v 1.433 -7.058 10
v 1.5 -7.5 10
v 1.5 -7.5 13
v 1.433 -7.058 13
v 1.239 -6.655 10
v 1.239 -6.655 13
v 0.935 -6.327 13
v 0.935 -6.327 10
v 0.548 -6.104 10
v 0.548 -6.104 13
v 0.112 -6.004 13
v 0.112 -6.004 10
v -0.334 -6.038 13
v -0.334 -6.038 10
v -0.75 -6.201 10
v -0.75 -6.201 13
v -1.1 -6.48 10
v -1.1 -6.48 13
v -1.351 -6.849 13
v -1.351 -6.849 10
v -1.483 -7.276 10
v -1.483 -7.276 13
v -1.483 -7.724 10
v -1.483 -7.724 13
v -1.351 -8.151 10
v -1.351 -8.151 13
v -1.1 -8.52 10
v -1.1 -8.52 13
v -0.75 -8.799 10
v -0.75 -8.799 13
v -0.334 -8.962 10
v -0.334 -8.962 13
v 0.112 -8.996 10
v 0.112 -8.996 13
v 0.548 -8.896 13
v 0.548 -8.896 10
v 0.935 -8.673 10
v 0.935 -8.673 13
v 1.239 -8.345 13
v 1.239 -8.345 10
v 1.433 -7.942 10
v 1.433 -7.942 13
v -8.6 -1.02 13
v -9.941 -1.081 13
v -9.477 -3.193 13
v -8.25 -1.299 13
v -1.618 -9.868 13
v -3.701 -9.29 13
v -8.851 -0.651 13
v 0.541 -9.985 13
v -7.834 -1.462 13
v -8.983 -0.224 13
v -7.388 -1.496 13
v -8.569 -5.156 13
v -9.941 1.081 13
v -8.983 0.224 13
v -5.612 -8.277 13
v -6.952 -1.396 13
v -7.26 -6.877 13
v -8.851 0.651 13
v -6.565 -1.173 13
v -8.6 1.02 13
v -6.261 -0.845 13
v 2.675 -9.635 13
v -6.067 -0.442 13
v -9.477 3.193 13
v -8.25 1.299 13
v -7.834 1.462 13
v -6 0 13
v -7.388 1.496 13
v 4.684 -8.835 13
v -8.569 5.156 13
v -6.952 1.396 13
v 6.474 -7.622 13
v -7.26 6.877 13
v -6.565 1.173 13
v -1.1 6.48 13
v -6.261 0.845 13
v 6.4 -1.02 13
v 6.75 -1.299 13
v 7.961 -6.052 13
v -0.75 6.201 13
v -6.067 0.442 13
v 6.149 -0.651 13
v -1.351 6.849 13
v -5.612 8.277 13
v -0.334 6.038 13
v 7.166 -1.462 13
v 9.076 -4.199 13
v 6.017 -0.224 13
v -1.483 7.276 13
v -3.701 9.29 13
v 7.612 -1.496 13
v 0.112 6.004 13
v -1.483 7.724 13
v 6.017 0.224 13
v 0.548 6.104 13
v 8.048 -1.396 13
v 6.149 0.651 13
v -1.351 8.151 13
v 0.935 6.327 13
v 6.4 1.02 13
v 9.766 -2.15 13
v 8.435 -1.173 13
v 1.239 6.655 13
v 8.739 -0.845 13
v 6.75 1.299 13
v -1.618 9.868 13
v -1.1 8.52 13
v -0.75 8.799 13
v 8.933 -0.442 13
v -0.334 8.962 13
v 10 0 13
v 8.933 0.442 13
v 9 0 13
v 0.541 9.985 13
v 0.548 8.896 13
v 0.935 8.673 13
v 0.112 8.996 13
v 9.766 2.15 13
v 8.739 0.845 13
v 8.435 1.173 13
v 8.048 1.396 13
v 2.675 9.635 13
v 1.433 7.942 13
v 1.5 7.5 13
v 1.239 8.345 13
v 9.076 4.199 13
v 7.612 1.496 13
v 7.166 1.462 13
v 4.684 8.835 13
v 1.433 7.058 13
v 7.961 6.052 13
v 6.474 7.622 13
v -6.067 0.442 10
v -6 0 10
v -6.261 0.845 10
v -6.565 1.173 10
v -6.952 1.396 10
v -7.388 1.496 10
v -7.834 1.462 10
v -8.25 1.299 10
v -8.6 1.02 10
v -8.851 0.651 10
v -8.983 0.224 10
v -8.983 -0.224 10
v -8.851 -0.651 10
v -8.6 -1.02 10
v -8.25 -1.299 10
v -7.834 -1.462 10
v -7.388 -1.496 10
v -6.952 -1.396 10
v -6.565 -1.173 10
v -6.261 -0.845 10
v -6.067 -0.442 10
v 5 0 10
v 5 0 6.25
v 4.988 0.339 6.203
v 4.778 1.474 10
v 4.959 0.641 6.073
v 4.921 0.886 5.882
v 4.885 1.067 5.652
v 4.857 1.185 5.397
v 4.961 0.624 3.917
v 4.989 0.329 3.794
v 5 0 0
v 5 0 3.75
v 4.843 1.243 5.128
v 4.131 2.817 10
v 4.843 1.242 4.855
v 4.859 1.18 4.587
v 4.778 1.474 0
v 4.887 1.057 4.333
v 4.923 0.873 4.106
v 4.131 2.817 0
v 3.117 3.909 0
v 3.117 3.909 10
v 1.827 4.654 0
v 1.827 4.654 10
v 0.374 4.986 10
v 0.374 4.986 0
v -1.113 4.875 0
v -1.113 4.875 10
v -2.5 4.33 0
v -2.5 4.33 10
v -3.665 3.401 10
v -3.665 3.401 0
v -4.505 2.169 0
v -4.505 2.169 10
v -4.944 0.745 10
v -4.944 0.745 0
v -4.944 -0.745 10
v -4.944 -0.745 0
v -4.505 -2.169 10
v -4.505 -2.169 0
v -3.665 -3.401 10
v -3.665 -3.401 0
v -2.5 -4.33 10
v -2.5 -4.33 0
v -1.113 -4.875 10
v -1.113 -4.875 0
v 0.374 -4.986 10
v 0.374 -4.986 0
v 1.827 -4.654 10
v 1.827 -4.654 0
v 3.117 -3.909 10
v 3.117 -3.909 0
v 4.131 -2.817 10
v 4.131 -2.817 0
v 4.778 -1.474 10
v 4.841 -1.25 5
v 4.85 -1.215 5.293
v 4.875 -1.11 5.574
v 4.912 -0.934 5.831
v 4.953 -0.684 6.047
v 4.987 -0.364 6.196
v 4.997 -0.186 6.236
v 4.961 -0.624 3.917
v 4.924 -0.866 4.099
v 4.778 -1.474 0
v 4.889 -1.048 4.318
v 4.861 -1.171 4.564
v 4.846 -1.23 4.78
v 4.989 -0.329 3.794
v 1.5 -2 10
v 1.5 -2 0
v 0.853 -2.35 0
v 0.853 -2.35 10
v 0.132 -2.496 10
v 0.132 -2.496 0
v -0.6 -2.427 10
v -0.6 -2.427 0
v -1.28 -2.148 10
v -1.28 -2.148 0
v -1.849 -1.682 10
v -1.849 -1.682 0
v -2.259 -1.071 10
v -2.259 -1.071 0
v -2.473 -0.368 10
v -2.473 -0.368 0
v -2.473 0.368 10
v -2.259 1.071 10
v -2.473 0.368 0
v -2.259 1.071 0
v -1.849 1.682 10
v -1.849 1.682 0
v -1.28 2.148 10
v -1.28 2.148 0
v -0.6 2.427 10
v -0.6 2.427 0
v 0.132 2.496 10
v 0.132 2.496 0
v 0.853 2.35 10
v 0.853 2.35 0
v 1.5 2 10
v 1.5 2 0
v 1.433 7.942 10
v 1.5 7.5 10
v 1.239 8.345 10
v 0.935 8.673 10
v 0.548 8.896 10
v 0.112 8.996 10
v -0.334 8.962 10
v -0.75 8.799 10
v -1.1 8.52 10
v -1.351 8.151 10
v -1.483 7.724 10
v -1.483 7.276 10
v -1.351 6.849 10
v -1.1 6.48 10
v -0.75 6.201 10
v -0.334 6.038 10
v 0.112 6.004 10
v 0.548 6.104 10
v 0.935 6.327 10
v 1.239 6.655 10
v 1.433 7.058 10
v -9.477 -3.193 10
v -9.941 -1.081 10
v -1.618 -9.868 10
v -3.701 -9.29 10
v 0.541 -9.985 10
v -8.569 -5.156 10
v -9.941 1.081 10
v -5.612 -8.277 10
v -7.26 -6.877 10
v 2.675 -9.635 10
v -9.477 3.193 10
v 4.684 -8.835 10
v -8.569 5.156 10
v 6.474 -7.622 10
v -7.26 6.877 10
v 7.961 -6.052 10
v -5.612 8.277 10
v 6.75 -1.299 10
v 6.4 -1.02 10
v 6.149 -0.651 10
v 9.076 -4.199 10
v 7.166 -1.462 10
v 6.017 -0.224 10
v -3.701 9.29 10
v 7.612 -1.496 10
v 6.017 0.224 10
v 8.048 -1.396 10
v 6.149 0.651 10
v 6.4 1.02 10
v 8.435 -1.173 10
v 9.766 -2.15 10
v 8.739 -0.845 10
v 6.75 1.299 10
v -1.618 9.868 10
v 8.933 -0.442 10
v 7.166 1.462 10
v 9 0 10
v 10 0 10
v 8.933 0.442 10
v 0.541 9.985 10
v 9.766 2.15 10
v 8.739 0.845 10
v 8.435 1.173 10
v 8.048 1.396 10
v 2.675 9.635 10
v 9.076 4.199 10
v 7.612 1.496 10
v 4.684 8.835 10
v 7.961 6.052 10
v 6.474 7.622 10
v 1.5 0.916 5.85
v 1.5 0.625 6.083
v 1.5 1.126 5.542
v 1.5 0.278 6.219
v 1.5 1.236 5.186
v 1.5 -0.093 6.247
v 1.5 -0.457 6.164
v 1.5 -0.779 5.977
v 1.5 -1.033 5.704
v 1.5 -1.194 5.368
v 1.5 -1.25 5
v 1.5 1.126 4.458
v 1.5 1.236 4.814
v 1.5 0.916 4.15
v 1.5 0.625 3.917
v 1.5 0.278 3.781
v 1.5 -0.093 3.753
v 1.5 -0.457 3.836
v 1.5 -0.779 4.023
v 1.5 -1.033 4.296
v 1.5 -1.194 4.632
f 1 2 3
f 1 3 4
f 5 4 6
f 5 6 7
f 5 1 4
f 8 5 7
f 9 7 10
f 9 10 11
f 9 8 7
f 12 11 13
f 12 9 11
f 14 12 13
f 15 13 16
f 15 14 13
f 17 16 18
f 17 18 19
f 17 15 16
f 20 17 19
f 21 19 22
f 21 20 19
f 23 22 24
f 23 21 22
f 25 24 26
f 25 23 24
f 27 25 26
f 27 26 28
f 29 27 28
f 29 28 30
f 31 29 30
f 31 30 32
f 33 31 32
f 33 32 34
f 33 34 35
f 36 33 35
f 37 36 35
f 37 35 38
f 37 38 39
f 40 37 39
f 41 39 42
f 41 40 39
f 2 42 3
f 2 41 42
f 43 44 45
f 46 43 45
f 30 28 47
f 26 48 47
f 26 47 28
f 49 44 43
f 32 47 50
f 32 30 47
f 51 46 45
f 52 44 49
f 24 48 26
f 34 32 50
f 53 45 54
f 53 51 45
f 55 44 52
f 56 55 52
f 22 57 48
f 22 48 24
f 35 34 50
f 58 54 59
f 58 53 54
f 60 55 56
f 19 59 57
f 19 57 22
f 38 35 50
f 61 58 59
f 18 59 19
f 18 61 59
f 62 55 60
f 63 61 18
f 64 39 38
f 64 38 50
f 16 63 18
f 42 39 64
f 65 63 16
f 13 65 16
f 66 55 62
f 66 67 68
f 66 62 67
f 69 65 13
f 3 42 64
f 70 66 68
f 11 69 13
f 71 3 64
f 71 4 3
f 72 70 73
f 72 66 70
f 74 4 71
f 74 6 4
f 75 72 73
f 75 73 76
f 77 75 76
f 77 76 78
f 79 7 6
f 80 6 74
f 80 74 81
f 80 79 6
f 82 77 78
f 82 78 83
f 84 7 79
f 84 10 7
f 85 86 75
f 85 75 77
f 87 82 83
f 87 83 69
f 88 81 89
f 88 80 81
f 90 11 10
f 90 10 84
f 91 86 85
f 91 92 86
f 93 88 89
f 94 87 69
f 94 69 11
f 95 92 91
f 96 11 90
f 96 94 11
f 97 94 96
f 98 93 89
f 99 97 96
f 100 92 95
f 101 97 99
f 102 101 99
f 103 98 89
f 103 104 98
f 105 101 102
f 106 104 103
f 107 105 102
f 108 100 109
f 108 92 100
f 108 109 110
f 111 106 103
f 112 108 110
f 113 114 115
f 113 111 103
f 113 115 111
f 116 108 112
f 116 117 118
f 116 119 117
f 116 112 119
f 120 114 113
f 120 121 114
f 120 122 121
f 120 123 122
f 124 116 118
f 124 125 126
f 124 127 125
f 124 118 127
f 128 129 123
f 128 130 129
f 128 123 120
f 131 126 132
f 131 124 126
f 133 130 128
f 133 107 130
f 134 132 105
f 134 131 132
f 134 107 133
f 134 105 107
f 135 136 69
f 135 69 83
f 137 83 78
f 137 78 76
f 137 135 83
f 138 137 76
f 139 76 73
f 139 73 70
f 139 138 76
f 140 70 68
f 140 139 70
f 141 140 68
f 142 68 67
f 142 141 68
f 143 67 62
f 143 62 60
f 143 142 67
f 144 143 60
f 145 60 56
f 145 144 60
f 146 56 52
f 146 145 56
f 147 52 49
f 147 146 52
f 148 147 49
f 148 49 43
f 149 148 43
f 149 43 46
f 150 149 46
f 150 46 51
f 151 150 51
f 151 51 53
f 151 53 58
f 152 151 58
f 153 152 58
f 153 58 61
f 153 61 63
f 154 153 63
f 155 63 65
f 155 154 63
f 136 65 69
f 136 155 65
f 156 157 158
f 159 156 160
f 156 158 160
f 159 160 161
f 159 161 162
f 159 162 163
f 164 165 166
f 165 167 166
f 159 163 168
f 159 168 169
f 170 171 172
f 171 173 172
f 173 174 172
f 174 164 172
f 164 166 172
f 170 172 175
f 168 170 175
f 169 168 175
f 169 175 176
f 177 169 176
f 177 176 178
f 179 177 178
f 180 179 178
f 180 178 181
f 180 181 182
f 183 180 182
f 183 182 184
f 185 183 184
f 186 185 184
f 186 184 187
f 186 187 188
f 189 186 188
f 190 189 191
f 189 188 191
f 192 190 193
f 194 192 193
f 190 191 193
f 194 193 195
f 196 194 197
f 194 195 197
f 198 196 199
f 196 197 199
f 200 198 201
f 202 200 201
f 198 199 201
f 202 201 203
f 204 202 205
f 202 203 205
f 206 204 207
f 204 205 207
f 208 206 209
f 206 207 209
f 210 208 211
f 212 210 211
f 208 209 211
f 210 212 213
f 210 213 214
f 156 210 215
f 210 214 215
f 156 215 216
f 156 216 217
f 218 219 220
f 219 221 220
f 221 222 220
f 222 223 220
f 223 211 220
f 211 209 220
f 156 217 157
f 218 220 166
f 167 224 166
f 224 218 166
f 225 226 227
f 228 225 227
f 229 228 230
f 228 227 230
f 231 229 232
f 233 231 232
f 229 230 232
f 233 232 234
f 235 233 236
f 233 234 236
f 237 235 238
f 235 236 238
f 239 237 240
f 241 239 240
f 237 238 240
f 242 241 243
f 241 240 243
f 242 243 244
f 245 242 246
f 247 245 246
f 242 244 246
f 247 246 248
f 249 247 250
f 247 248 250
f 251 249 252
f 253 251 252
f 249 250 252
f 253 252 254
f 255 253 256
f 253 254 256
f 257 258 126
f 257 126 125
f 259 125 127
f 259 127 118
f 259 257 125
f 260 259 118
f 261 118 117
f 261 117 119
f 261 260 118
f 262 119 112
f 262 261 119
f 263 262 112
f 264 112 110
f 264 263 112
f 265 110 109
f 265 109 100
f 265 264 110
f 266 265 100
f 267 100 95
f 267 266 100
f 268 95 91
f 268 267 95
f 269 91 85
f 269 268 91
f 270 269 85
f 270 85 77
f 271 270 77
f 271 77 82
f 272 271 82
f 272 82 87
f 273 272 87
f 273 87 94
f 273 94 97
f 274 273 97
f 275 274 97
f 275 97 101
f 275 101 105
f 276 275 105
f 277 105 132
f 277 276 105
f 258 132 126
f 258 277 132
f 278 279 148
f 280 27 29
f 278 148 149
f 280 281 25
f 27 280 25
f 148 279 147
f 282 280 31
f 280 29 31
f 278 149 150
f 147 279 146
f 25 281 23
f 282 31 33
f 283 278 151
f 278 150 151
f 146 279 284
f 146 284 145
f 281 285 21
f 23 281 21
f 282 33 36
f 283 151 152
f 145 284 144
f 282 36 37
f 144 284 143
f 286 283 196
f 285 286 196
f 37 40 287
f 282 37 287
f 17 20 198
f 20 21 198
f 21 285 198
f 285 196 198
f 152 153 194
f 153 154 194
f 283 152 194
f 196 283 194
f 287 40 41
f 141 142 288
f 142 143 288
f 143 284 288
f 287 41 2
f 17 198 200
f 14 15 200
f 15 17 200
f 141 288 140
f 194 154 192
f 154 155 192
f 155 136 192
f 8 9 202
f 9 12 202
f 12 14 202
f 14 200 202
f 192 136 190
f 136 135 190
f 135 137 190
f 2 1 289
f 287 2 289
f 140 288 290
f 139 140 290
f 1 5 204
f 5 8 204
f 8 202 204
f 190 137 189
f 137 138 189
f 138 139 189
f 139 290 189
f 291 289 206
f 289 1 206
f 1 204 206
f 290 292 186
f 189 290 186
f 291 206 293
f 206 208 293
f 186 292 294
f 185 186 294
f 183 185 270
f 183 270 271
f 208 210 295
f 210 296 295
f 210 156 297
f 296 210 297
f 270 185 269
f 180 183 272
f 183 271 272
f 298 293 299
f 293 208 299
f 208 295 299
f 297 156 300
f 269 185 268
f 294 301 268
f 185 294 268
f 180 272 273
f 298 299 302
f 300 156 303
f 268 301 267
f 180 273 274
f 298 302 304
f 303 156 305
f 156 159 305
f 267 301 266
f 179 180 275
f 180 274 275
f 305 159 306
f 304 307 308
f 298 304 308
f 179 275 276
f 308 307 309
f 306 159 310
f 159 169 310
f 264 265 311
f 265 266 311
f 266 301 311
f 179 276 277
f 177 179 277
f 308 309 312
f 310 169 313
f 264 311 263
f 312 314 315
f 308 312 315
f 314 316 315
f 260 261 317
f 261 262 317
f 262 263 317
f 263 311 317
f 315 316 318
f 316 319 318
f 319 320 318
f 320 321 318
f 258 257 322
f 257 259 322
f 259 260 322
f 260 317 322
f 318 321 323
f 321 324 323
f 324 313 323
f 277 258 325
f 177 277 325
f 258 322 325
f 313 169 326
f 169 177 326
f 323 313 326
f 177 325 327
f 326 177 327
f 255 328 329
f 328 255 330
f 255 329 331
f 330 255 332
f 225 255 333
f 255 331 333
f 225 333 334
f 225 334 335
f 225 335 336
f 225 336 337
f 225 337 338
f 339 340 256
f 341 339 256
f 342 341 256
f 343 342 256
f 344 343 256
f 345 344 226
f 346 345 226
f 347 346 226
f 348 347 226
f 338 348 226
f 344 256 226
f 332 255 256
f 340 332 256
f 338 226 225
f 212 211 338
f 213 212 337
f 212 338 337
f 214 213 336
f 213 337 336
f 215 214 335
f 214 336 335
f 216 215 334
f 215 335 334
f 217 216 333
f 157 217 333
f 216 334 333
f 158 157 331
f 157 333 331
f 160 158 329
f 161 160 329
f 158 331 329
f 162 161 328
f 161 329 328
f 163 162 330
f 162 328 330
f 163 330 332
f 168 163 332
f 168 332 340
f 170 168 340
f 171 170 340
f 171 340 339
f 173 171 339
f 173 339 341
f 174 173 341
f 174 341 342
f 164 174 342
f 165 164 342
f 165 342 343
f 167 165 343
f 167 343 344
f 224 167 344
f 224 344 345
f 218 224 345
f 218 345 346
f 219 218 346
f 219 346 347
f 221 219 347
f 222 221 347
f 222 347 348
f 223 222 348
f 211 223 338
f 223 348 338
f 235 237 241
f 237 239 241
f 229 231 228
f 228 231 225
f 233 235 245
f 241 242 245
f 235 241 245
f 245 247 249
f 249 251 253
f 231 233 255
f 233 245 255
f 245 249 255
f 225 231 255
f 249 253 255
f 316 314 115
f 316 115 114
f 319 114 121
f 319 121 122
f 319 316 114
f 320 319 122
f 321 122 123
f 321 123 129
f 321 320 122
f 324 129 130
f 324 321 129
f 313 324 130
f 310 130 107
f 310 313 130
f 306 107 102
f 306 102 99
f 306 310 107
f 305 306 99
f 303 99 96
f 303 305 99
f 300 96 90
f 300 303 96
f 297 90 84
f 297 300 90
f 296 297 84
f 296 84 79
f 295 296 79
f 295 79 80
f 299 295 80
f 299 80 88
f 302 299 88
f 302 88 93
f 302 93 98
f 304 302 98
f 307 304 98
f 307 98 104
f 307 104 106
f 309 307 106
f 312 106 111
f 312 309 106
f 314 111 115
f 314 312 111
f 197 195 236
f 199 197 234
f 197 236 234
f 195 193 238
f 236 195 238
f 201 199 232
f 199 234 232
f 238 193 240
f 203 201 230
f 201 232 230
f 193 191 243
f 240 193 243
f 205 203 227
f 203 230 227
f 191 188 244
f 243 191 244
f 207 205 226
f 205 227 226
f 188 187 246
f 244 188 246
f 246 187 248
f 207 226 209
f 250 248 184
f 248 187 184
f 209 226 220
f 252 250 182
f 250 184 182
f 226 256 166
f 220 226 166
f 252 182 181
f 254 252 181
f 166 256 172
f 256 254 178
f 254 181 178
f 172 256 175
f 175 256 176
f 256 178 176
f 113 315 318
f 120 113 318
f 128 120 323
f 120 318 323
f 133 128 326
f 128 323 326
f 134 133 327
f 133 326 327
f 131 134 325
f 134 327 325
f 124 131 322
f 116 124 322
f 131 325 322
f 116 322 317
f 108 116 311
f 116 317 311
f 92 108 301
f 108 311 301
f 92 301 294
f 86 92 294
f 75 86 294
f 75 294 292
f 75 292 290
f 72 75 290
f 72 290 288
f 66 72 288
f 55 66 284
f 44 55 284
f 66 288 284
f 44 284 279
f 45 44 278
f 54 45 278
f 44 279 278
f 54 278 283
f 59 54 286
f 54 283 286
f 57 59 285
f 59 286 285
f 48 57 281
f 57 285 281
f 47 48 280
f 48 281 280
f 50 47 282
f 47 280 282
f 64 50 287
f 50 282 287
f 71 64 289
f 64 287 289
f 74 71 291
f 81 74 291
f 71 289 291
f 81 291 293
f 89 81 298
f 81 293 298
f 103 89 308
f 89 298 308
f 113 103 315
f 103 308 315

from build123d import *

# Parameters (mm, degrees)
F0_R     = 5
F1_DEPTH = 10
F2_R     = 1.25
F3_DEPTH = 3.5
F4_R     = 10
F4_R_2   = 1.5
F4_R_3   = 5
F5_DEPTH = 3


with BuildPart() as f1:
    # F0 (on Top) → F1 (new body)
    with BuildSketch(Plane.XY):
        Circle(F0_R)
        with BuildLine():
            ThreePointArc((1.5, 2), (2.2360679775, 1.1180339887), (2.5, 0))
            ThreePointArc((2.5, 0), (2.2360679775, -1.1180339887), (1.5, -2))
            ThreePointArc((1.5, -2), (-2.5, 0), (1.5, 2))
        make_face(mode=Mode.SUBTRACT)
        with BuildLine():
            ThreePointArc((1.5, -2), (2.2360679775, -1.1180339887), (2.5, 0))
            ThreePointArc((2.5, 0), (2.2360679775, 1.1180339887), (1.5, 2))
            Line((1.5, 2), (1.5, -2))
        make_face()
    extrude(amount=F1_DEPTH)

    # F2 (on face) → F3 (cut, through all)
    with BuildSketch(Plane(origin=(1.5, 0, 0), x_dir=(0, -1, 0), z_dir=(-1, 0, 0))):
        with Locations((0, 5)):
            Circle(F2_R)
    extrude(amount=-F3_DEPTH, mode=Mode.SUBTRACT)

    # F4 (on face) → F5 (join)
    with BuildSketch(Plane.XY.offset(10)):
        Circle(F4_R)
        with Locations((0, -7.5)):
            Circle(F4_R_2, mode=Mode.SUBTRACT)
        with Locations((-7.5, 0)):
            Circle(F4_R_2, mode=Mode.SUBTRACT)
        Circle(F4_R_3, mode=Mode.SUBTRACT)
        with Locations((7.5, 0)):
            Circle(F4_R_2, mode=Mode.SUBTRACT)
        with Locations((0, 7.5)):
            Circle(F4_R_2, mode=Mode.SUBTRACT)
        Circle(F4_R_3)
        with BuildLine():
            Line((1.5, 2), (1.5, -2))
            ThreePointArc((1.5, -2), (-2.5, 0), (1.5, 2))
        make_face(mode=Mode.SUBTRACT)
        with BuildLine():
            ThreePointArc((1.5, 2), (-2.5, 0), (1.5, -2))
            Line((1.5, -2), (1.5, 2))
        make_face()
    extrude(amount=F5_DEPTH)


solid = f1.part
